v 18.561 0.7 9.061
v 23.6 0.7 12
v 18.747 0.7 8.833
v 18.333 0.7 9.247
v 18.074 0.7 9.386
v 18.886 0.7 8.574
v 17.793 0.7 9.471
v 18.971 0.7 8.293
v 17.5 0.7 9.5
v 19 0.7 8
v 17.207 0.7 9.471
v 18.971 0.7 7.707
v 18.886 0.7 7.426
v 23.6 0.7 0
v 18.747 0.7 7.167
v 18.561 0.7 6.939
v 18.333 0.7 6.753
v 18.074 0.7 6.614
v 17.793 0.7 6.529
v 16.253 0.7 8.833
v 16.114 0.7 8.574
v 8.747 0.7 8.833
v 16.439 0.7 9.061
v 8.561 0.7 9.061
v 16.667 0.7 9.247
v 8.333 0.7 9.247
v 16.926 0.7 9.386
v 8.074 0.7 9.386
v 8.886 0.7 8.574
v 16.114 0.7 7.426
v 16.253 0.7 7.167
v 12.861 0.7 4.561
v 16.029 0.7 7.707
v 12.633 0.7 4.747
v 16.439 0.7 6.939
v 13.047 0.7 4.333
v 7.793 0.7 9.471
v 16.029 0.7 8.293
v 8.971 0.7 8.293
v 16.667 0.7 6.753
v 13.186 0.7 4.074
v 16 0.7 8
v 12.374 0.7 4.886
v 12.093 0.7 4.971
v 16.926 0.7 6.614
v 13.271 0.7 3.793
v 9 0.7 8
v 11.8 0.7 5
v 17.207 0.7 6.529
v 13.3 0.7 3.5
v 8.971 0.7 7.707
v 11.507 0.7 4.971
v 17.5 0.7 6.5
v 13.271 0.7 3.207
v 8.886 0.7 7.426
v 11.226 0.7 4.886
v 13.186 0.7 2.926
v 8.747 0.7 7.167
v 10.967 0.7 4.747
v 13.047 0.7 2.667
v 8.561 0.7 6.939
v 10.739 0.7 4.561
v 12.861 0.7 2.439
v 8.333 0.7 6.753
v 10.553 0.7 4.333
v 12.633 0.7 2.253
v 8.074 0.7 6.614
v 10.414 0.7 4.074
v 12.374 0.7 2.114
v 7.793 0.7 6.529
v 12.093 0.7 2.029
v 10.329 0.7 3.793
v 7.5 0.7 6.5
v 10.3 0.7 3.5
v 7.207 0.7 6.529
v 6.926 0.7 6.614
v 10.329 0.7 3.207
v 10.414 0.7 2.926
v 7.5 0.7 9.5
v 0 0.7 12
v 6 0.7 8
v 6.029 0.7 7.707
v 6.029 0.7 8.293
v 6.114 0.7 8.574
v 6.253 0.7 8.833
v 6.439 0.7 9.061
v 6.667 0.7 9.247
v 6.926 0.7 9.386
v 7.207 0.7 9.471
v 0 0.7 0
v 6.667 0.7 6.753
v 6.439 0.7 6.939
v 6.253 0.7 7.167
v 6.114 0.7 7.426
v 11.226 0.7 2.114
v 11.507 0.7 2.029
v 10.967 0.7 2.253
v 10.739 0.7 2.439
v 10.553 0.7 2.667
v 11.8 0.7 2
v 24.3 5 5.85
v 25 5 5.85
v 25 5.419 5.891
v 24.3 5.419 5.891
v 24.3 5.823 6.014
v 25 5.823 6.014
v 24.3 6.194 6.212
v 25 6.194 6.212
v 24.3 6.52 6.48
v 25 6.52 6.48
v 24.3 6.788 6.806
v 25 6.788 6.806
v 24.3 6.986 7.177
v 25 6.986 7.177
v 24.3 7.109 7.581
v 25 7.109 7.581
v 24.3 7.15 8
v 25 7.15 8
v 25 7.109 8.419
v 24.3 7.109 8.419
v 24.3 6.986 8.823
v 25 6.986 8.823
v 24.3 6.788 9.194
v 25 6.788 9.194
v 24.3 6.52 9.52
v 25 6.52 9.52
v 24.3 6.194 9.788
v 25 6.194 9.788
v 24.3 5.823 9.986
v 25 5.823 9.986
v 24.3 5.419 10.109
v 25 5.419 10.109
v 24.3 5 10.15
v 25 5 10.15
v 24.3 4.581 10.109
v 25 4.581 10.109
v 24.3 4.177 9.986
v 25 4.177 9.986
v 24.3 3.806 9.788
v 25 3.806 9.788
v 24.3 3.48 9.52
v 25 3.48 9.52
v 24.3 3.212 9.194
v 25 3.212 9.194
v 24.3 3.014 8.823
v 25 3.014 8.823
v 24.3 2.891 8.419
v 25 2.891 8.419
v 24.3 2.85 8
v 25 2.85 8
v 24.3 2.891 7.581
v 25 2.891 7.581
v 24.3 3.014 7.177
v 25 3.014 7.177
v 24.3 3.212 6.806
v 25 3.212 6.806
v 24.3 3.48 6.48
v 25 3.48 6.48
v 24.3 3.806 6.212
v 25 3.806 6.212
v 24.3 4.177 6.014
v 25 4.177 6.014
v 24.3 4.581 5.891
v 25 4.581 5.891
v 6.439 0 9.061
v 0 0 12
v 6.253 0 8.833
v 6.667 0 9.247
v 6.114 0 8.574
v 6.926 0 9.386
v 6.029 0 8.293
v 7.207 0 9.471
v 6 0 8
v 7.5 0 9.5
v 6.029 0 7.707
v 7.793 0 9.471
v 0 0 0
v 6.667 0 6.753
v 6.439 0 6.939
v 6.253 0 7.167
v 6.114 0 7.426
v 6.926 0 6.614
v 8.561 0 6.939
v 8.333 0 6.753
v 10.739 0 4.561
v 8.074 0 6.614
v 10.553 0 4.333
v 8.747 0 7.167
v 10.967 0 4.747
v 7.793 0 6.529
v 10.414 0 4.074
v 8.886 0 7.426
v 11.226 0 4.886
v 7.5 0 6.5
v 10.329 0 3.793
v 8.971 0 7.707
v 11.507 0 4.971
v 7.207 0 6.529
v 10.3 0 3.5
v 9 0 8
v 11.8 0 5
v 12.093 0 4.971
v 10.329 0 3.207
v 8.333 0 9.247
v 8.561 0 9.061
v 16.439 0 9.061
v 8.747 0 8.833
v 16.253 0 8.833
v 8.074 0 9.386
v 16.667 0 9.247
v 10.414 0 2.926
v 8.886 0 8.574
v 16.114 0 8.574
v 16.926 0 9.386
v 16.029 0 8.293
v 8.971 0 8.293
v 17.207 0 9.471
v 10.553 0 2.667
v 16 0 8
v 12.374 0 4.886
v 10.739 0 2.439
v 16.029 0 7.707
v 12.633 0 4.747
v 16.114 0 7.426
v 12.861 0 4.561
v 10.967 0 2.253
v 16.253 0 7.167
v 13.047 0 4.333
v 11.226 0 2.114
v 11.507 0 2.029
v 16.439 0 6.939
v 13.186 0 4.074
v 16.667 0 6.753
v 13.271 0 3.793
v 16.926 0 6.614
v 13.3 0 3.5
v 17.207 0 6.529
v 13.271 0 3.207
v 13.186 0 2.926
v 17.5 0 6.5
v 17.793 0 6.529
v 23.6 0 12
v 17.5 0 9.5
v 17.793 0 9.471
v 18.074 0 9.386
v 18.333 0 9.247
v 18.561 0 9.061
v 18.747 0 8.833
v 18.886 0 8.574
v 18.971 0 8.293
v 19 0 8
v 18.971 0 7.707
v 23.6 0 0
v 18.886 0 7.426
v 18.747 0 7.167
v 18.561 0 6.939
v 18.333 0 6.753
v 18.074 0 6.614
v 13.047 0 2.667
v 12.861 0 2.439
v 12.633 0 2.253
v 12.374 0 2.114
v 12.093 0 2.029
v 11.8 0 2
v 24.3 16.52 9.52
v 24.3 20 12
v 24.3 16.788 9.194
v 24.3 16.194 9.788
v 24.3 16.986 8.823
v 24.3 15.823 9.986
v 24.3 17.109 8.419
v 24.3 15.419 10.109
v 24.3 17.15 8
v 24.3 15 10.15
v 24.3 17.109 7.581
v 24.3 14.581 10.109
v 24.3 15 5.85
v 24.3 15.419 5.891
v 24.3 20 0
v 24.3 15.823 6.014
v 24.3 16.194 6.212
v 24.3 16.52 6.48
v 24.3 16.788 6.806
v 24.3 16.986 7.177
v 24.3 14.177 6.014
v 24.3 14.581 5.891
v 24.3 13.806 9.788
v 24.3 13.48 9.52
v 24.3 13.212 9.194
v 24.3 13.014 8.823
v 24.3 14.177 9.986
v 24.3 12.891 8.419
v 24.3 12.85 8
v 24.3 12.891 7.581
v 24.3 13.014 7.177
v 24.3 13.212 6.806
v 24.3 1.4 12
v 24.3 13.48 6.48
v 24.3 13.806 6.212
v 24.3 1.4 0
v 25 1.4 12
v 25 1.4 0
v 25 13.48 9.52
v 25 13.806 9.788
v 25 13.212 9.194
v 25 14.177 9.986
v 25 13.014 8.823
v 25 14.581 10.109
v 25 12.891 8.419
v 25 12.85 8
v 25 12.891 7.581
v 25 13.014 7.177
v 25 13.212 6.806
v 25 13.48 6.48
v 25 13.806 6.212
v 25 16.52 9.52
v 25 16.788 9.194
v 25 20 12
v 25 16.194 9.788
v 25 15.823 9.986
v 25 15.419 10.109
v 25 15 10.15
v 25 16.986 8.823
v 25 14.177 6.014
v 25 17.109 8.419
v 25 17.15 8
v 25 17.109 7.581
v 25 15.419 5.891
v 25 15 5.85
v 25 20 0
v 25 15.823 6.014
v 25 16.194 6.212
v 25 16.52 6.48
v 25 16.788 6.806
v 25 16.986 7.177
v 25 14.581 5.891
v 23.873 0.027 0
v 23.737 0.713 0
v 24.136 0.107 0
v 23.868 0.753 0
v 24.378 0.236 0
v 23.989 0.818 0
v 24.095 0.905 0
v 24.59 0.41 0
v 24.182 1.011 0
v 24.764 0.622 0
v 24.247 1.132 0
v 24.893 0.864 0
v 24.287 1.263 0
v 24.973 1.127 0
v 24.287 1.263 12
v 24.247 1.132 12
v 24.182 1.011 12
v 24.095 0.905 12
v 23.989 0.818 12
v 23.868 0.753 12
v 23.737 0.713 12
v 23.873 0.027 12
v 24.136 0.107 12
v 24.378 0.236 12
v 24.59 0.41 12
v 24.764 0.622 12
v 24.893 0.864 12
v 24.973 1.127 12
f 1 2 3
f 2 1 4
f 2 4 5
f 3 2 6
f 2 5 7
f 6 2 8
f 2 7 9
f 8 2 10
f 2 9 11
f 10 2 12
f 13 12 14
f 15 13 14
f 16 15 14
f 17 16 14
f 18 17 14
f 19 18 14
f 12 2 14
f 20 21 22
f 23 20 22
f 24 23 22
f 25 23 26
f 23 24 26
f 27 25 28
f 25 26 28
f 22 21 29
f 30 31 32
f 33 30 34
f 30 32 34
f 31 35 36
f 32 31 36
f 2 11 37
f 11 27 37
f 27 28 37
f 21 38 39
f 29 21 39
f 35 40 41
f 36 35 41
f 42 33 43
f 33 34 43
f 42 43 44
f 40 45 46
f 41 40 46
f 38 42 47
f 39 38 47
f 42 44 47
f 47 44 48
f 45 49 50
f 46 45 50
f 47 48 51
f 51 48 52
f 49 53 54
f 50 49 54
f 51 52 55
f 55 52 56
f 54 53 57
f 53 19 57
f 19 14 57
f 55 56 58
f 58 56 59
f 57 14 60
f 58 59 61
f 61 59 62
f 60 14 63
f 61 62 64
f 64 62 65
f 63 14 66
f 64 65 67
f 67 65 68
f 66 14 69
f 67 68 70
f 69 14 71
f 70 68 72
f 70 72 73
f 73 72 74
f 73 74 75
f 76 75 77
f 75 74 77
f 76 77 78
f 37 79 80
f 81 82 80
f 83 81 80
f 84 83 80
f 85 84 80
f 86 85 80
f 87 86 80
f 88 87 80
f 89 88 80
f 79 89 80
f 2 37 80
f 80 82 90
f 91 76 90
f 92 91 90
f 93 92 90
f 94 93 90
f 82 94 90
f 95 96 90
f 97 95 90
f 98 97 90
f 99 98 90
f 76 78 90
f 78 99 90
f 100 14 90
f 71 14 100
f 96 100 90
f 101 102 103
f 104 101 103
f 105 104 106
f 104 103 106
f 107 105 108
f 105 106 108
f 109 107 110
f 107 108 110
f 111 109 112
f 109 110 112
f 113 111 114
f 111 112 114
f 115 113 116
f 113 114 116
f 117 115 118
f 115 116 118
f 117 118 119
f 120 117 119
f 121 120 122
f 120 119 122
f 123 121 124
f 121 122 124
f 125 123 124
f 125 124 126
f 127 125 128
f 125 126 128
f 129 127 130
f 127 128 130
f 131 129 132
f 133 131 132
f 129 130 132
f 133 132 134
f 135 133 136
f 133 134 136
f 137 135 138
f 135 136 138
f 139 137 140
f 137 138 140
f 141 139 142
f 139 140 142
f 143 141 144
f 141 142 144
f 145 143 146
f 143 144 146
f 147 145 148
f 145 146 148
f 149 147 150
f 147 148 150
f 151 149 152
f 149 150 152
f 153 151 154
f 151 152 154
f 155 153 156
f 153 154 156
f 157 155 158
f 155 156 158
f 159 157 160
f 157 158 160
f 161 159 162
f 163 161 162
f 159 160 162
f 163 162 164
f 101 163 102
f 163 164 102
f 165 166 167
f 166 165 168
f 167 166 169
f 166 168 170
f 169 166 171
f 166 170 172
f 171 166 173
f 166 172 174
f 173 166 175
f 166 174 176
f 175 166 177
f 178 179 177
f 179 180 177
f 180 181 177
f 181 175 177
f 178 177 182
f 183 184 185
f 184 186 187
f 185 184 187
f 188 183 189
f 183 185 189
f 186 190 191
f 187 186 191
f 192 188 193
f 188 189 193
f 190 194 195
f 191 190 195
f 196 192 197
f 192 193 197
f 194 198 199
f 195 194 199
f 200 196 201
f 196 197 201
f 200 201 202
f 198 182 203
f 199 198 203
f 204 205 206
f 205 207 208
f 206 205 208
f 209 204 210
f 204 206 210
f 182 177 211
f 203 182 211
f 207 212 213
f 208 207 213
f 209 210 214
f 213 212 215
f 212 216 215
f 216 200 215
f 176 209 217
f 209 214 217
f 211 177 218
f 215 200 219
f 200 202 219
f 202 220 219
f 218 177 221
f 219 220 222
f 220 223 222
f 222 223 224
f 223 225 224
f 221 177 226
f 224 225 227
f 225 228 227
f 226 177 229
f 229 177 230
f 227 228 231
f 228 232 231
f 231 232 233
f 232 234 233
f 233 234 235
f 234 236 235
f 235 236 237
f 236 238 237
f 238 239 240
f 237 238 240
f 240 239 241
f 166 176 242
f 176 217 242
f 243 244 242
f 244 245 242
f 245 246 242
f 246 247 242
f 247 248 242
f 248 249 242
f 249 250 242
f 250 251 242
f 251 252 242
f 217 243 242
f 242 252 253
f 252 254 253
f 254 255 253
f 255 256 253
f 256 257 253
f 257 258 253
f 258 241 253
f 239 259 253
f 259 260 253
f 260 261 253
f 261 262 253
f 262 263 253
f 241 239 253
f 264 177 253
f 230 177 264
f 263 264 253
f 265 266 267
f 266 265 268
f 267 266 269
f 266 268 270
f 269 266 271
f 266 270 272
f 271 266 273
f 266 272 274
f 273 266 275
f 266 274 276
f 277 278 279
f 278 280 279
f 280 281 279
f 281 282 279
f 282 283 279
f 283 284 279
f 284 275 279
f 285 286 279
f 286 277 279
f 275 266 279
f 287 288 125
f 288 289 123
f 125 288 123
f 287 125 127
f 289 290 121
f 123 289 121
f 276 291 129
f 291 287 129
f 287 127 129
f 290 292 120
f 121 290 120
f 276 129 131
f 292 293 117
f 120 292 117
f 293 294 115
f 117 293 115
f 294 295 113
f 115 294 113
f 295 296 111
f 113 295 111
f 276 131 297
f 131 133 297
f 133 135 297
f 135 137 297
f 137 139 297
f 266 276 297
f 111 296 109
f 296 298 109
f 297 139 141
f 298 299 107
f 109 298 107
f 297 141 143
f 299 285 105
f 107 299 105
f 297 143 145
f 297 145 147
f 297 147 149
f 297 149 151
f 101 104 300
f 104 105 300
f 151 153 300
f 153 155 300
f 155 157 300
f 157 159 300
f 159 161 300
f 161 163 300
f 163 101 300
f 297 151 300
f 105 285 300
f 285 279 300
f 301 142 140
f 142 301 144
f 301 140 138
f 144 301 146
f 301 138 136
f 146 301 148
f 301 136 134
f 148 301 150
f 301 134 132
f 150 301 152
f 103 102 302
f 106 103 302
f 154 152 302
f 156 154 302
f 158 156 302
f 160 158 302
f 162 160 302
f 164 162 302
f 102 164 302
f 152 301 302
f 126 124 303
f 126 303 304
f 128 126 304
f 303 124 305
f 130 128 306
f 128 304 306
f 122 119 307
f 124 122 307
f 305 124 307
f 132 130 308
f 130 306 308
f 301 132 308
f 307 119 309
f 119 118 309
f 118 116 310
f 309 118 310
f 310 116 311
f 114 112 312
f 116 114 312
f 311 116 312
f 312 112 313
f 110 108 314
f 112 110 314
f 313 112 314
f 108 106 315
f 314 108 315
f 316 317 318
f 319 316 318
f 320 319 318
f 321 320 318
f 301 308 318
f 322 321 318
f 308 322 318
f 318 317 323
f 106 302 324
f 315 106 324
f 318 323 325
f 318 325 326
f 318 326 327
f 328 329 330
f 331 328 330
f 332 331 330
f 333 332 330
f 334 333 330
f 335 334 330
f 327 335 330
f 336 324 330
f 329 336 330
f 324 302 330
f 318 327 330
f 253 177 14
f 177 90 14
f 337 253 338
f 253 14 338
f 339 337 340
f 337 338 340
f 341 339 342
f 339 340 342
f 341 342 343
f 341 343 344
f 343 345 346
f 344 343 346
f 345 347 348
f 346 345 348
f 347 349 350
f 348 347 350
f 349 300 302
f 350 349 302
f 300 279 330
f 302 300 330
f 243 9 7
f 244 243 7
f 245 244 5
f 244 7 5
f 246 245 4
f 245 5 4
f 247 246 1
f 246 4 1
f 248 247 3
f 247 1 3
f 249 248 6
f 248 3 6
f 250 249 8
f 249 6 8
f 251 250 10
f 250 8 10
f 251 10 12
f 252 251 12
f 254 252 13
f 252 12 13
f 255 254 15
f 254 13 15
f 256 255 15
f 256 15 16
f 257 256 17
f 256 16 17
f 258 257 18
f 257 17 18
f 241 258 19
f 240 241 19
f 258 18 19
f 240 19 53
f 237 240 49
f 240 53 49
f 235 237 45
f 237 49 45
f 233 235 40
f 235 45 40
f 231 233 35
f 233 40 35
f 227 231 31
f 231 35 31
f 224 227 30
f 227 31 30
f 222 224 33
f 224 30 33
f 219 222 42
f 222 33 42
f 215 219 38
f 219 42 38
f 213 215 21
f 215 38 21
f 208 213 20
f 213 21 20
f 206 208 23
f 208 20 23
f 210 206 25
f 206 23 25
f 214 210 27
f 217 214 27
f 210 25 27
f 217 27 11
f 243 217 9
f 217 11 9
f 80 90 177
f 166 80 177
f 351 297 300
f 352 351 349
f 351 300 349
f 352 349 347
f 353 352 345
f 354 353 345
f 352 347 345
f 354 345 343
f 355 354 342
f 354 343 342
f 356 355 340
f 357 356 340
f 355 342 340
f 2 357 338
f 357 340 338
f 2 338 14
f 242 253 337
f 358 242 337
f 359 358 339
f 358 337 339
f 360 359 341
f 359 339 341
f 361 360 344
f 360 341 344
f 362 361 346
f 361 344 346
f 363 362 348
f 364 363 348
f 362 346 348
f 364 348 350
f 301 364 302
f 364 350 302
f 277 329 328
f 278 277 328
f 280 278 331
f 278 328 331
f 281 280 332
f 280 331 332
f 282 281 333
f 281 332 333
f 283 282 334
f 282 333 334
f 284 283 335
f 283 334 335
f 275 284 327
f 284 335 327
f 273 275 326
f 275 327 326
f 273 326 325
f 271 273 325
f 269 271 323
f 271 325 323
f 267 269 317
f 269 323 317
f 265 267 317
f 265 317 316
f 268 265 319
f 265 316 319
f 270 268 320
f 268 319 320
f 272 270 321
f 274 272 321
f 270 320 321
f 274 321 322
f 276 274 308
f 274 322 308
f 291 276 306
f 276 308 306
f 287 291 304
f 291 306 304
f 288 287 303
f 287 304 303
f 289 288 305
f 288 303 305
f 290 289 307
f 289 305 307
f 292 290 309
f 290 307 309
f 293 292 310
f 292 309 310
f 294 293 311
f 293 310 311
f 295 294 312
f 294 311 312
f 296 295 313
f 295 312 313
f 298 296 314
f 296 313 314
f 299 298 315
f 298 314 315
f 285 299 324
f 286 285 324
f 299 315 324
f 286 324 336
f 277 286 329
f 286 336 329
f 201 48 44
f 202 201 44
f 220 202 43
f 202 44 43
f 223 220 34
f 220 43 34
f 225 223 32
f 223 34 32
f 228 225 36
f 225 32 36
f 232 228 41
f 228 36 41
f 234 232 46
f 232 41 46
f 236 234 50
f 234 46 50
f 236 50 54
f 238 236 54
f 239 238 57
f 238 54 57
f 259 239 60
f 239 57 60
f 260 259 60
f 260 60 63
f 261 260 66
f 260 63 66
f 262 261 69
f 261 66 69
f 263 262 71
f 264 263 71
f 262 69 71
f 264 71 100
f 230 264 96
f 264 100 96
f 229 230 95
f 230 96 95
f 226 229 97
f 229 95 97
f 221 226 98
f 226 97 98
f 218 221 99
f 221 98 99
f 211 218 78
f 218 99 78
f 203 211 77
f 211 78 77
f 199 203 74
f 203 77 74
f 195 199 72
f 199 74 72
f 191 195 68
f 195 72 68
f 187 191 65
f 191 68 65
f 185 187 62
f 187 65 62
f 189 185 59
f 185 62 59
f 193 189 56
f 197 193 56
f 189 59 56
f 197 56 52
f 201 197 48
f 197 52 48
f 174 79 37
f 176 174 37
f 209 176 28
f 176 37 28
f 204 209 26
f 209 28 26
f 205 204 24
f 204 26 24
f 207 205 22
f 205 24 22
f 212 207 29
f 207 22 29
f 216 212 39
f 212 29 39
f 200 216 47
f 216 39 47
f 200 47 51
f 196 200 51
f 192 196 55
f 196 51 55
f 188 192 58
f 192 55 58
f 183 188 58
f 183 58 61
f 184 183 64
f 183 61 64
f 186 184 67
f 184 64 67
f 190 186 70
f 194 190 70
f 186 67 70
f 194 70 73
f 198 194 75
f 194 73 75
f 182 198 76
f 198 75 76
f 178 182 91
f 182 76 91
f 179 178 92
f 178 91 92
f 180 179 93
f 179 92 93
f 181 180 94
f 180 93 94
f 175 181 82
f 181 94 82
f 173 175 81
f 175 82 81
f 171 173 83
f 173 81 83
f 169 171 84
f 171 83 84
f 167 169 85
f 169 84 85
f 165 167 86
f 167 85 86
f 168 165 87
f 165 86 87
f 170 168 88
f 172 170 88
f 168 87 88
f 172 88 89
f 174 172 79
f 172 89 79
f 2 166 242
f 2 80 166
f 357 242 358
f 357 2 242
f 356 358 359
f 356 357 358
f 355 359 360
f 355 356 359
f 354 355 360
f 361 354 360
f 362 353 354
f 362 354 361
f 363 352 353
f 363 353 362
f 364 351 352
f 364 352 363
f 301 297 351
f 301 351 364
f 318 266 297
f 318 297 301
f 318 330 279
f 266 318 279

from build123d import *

# Parameters (mm, degrees)
BASE_FLANGE1_DEPTH = 12
SKETCH6_R          = 1.5
CUT_EXTRUDE1_DEPTH = 0.7
SKETCH7_R          = 2.15
CUT_EXTRUDE2_DEPTH = 0.7


# Sheet-metal steps are written as plain solids
with BuildPart() as part:
    # Sketch1 → Base-Flange1 (new body)
    with BuildSketch(Plane.XY):
        with BuildLine():
            Line((0, 0), (23.6, 0))
            ThreePointArc((23.6, 0), (24.589949494, 0.410050506), (25, 1.4))
            Line((25, 1.4), (25, 20))
            Line((25, 20), (24.3, 20))
            Line((24.3, 20), (24.3, 1.4))
            ThreePointArc((24.3, 1.4), (24.094974747, 0.905025253), (23.6, 0.7))
            Line((23.6, 0.7), (0, 0.7))
            Line((0, 0.7), (0, 0))
        make_face()
    extrude(amount=BASE_FLANGE1_DEPTH)

    # Sketch6 → Cut-Extrude1 (cut)
    with BuildSketch(Plane(origin=(0, 0.7, 0), x_dir=(1, 0, 0), z_dir=(0, 1, 0))):
        with Locations(Location((7.5, -8, 0), (0, 0, 270))):
            Circle(SKETCH6_R)
        with Locations(Location((17.5, -8, 0), (0, 0, 270))):
            Circle(SKETCH6_R)
        with Locations(Location((11.8, -3.5, 0), (0, 0, 270))):
            Circle(SKETCH6_R)
    extrude(amount=-CUT_EXTRUDE1_DEPTH, mode=Mode.SUBTRACT)

    # Sketch7 → Cut-Extrude2 (cut)
    with BuildSketch(Plane(origin=(25, 0, 0), x_dir=(0, 0, -1), z_dir=(1, 0, 0))):
        with Locations((-8, 15)):
            Circle(SKETCH7_R)
        with Locations((-8, 5)):
            Circle(SKETCH7_R)
    extrude(amount=-CUT_EXTRUDE2_DEPTH, mode=Mode.SUBTRACT)


solid = part.part
